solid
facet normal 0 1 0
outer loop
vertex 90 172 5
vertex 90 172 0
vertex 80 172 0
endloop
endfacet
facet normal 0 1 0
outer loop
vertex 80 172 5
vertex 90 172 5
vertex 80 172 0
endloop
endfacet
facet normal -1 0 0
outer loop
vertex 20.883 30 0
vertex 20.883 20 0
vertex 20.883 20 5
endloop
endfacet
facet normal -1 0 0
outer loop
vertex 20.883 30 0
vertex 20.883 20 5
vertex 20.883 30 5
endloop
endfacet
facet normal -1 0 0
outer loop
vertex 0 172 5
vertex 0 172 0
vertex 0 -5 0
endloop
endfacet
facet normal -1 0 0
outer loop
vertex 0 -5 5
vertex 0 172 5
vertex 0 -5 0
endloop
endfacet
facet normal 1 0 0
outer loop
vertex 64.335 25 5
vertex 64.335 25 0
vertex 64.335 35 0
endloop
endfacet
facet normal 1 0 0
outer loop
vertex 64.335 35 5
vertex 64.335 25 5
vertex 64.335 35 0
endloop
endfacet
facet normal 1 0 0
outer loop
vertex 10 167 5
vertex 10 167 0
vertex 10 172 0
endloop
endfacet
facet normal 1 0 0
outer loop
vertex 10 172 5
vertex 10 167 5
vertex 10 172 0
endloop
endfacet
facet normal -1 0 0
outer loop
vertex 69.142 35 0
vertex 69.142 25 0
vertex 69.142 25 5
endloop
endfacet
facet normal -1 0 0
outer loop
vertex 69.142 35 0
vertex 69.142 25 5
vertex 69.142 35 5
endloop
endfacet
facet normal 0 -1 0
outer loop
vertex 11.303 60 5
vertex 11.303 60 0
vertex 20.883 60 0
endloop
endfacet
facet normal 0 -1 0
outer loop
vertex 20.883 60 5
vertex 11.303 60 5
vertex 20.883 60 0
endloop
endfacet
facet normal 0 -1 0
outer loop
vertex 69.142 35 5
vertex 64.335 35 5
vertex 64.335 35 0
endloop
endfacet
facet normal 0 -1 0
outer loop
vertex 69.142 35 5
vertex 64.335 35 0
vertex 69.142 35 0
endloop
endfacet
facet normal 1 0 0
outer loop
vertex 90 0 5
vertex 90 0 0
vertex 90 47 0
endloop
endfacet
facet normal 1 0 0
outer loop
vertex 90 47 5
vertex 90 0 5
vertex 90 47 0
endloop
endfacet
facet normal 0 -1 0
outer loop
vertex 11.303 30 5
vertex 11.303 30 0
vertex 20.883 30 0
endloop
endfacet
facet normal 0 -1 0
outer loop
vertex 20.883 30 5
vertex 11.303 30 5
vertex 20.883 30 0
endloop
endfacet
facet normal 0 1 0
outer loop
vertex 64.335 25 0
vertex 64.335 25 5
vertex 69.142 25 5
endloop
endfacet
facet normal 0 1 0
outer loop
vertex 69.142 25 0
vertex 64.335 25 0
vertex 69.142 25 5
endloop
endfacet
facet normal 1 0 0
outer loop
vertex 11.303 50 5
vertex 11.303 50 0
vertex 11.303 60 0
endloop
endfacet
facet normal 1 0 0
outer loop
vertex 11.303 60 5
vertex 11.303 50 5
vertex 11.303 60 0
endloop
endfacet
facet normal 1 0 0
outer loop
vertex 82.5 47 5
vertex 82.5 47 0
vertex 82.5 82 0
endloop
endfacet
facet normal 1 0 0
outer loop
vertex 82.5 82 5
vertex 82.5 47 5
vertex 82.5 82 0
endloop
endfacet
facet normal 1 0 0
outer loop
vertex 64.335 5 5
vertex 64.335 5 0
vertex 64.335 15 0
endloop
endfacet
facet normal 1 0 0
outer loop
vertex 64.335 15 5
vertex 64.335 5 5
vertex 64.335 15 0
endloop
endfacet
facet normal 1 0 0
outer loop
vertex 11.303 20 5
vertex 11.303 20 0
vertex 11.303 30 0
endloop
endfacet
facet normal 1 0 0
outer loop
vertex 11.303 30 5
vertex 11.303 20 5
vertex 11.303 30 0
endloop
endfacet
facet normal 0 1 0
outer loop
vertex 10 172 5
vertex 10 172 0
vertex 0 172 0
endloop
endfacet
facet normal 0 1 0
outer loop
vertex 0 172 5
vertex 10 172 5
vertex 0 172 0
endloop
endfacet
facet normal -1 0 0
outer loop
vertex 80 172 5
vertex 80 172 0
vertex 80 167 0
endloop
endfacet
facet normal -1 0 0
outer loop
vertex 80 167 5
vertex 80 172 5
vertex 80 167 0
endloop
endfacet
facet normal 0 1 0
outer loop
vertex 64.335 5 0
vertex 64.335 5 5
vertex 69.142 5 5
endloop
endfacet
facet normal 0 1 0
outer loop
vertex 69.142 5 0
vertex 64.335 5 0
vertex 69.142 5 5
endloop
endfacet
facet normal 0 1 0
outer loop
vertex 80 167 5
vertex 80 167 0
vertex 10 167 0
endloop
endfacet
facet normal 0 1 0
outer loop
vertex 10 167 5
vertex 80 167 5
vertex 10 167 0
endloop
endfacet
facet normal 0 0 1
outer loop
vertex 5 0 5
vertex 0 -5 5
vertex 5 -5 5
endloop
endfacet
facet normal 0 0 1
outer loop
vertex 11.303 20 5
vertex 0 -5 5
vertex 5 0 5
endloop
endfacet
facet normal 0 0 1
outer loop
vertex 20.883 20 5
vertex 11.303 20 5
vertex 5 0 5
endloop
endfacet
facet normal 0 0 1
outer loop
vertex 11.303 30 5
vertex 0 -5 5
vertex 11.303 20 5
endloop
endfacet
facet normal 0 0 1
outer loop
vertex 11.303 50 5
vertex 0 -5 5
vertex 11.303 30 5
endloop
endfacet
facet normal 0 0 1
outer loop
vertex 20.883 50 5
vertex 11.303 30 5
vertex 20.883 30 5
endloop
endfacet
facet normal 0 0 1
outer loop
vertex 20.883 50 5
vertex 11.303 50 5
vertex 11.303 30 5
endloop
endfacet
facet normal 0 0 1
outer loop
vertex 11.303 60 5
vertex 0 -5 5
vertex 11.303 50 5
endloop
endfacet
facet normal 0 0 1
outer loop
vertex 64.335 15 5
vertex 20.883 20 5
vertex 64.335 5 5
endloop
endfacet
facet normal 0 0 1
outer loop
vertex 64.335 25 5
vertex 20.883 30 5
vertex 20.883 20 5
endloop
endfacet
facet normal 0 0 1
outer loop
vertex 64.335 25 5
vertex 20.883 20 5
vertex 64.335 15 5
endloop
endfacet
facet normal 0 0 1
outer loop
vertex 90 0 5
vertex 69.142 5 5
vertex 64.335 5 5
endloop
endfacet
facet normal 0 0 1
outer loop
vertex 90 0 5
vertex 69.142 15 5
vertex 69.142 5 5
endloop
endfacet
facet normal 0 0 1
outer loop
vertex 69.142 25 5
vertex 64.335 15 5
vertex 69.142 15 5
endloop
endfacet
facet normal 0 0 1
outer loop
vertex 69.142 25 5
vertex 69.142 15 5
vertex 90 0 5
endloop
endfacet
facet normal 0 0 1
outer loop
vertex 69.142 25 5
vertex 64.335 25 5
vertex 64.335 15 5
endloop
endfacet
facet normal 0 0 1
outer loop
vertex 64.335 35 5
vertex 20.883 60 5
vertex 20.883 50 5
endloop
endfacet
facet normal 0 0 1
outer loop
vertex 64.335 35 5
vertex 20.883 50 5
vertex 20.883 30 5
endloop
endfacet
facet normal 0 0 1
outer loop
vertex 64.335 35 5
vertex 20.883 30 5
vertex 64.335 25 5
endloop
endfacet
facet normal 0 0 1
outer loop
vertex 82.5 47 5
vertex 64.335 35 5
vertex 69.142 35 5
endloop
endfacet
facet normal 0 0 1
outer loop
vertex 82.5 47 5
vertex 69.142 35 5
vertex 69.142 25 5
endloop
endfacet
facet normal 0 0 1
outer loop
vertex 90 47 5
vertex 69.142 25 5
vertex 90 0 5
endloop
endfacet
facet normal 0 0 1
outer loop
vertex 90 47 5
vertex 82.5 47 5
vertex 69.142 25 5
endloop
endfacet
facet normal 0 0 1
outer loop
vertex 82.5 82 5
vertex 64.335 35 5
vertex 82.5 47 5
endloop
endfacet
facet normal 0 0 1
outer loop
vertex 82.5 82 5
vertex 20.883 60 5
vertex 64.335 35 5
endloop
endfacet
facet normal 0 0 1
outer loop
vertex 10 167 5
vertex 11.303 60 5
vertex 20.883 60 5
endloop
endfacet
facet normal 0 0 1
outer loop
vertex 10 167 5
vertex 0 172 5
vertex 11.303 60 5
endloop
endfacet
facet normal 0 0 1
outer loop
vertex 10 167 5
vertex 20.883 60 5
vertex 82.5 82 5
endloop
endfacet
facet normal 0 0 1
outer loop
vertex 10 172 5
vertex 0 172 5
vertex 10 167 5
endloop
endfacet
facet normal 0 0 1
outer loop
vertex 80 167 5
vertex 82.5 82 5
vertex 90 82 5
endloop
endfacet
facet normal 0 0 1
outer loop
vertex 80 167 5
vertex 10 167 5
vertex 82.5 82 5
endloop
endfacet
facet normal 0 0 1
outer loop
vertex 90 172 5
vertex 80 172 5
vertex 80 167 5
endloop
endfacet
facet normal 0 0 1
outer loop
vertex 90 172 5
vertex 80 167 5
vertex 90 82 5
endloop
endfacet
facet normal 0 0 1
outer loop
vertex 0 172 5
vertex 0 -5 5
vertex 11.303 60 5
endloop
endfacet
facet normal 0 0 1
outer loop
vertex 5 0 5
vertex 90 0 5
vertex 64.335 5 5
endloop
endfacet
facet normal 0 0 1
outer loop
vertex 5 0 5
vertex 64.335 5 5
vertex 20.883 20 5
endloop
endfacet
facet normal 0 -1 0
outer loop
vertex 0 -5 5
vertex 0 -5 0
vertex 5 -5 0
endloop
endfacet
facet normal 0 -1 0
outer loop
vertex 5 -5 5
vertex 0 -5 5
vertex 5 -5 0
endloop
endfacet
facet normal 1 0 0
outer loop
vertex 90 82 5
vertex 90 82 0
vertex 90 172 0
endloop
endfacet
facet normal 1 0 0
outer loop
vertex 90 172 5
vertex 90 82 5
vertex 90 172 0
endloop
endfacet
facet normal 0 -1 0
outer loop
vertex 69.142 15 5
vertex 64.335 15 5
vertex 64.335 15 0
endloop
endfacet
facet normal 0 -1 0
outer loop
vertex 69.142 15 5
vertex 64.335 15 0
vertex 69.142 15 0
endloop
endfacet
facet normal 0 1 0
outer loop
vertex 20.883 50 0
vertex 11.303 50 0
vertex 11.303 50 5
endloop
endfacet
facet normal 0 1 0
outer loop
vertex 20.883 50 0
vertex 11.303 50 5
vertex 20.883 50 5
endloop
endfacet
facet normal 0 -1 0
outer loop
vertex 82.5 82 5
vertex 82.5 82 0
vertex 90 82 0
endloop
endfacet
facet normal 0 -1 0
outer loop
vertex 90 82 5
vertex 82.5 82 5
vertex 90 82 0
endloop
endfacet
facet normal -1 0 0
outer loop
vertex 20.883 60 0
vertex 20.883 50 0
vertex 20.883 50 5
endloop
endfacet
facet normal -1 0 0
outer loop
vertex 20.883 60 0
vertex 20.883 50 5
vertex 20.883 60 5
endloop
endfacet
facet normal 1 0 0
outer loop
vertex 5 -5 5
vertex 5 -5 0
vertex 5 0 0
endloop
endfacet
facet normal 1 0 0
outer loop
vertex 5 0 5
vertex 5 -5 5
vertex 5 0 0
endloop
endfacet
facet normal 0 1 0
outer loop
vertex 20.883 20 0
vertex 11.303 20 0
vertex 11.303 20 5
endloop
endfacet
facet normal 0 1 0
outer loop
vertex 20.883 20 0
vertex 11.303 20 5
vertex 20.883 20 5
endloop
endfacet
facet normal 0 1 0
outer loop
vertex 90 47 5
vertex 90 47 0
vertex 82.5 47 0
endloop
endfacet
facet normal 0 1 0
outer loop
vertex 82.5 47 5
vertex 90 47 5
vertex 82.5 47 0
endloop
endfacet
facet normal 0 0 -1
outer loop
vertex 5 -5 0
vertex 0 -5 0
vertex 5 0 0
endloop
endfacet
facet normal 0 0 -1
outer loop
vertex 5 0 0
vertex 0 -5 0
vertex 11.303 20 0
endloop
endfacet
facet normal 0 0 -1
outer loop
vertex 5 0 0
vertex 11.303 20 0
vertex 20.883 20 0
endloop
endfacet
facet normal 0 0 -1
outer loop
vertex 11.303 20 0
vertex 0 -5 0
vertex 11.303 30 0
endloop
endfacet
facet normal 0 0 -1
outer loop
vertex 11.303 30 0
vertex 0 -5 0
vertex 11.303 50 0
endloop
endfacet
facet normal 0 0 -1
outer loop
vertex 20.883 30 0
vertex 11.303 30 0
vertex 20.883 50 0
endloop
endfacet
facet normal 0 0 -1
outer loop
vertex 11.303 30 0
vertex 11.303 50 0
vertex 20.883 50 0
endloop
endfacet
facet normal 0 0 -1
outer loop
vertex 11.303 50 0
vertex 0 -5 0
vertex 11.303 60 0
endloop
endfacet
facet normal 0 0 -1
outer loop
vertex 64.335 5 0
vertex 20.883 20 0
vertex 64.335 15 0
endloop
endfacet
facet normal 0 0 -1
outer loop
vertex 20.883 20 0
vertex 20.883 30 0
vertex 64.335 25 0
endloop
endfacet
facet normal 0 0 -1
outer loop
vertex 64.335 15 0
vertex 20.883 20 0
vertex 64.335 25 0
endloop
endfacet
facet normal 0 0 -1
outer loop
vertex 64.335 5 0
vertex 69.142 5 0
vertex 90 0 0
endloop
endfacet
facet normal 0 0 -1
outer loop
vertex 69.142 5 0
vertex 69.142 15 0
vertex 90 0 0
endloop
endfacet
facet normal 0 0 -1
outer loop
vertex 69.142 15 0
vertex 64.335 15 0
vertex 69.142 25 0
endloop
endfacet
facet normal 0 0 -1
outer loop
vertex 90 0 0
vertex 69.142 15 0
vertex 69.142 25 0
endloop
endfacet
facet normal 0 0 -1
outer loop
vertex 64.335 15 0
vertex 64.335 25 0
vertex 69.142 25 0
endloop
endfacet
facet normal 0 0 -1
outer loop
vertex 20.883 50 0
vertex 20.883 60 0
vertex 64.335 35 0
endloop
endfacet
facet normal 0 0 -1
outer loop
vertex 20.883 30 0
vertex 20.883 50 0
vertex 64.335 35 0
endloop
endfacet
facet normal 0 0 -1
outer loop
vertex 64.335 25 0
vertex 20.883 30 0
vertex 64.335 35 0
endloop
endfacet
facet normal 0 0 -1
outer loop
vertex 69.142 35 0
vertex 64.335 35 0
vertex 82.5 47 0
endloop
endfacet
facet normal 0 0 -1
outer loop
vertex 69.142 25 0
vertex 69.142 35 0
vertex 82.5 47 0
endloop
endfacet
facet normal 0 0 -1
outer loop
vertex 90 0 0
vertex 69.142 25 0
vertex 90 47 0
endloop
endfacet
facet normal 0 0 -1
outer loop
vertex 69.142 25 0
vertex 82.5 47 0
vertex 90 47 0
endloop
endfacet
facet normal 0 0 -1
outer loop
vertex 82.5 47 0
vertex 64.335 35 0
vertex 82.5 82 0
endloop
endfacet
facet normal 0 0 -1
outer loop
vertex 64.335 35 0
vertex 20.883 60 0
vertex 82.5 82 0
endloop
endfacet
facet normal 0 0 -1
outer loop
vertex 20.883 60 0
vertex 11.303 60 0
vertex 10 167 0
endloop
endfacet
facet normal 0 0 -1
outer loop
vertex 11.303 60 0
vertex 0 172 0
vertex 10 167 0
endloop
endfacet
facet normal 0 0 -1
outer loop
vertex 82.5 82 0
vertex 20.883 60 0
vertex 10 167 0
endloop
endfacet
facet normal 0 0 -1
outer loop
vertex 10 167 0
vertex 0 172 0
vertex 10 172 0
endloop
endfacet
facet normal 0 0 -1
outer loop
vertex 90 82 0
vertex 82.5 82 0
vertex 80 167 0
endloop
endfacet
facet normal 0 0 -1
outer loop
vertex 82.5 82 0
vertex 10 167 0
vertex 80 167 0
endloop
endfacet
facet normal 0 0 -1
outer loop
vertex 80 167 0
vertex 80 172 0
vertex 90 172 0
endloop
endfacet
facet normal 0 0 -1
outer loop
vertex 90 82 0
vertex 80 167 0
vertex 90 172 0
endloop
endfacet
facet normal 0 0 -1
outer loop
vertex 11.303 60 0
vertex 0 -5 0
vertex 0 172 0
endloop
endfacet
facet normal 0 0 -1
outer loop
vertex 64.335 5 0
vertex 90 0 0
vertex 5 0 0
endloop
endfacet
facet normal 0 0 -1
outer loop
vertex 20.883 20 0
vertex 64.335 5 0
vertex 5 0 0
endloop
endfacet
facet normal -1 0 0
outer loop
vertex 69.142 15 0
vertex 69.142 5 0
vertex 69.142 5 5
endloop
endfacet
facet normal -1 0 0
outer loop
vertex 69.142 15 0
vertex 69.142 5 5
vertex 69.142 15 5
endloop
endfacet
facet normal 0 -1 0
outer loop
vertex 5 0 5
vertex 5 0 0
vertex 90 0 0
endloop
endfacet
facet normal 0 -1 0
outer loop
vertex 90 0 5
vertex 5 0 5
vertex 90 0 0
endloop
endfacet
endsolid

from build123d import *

# Parameters (mm, degrees)
ESQUISSE1_W        = 4.807532778
ESQUISSE1_H        = 10
ESQUISSE1_W_2      = 9.57980661
BOSS_EXTRU_1_DEPTH = 5


with BuildPart() as part:
    # Esquisse1 → Boss.-Extru.1 (new body)
    with BuildSketch(Plane.XY):
        Polygon((90, 82), (90, 167), (90, 172), (80, 172), (80, 167), (10, 167), (10, 172), (0, 172), (0, 167), (0, 0), (0, -5), (5, -5), (5, 0), (90, 0), (90, 47), (82.5, 47), (82.5, 82), align=None)
        with Locations((66.738521132, 30)):
            Rectangle(ESQUISSE1_W, ESQUISSE1_H, mode=Mode.SUBTRACT)
        with Locations((66.738521132, 10)):
            Rectangle(ESQUISSE1_W, ESQUISSE1_H, mode=Mode.SUBTRACT)
        with Locations((16.093272864, 25)):
            Rectangle(ESQUISSE1_W_2, ESQUISSE1_H, mode=Mode.SUBTRACT)
        with Locations((16.093272864, 55)):
            Rectangle(ESQUISSE1_W_2, ESQUISSE1_H, mode=Mode.SUBTRACT)
    extrude(amount=BOSS_EXTRU_1_DEPTH)


solid = part.part
